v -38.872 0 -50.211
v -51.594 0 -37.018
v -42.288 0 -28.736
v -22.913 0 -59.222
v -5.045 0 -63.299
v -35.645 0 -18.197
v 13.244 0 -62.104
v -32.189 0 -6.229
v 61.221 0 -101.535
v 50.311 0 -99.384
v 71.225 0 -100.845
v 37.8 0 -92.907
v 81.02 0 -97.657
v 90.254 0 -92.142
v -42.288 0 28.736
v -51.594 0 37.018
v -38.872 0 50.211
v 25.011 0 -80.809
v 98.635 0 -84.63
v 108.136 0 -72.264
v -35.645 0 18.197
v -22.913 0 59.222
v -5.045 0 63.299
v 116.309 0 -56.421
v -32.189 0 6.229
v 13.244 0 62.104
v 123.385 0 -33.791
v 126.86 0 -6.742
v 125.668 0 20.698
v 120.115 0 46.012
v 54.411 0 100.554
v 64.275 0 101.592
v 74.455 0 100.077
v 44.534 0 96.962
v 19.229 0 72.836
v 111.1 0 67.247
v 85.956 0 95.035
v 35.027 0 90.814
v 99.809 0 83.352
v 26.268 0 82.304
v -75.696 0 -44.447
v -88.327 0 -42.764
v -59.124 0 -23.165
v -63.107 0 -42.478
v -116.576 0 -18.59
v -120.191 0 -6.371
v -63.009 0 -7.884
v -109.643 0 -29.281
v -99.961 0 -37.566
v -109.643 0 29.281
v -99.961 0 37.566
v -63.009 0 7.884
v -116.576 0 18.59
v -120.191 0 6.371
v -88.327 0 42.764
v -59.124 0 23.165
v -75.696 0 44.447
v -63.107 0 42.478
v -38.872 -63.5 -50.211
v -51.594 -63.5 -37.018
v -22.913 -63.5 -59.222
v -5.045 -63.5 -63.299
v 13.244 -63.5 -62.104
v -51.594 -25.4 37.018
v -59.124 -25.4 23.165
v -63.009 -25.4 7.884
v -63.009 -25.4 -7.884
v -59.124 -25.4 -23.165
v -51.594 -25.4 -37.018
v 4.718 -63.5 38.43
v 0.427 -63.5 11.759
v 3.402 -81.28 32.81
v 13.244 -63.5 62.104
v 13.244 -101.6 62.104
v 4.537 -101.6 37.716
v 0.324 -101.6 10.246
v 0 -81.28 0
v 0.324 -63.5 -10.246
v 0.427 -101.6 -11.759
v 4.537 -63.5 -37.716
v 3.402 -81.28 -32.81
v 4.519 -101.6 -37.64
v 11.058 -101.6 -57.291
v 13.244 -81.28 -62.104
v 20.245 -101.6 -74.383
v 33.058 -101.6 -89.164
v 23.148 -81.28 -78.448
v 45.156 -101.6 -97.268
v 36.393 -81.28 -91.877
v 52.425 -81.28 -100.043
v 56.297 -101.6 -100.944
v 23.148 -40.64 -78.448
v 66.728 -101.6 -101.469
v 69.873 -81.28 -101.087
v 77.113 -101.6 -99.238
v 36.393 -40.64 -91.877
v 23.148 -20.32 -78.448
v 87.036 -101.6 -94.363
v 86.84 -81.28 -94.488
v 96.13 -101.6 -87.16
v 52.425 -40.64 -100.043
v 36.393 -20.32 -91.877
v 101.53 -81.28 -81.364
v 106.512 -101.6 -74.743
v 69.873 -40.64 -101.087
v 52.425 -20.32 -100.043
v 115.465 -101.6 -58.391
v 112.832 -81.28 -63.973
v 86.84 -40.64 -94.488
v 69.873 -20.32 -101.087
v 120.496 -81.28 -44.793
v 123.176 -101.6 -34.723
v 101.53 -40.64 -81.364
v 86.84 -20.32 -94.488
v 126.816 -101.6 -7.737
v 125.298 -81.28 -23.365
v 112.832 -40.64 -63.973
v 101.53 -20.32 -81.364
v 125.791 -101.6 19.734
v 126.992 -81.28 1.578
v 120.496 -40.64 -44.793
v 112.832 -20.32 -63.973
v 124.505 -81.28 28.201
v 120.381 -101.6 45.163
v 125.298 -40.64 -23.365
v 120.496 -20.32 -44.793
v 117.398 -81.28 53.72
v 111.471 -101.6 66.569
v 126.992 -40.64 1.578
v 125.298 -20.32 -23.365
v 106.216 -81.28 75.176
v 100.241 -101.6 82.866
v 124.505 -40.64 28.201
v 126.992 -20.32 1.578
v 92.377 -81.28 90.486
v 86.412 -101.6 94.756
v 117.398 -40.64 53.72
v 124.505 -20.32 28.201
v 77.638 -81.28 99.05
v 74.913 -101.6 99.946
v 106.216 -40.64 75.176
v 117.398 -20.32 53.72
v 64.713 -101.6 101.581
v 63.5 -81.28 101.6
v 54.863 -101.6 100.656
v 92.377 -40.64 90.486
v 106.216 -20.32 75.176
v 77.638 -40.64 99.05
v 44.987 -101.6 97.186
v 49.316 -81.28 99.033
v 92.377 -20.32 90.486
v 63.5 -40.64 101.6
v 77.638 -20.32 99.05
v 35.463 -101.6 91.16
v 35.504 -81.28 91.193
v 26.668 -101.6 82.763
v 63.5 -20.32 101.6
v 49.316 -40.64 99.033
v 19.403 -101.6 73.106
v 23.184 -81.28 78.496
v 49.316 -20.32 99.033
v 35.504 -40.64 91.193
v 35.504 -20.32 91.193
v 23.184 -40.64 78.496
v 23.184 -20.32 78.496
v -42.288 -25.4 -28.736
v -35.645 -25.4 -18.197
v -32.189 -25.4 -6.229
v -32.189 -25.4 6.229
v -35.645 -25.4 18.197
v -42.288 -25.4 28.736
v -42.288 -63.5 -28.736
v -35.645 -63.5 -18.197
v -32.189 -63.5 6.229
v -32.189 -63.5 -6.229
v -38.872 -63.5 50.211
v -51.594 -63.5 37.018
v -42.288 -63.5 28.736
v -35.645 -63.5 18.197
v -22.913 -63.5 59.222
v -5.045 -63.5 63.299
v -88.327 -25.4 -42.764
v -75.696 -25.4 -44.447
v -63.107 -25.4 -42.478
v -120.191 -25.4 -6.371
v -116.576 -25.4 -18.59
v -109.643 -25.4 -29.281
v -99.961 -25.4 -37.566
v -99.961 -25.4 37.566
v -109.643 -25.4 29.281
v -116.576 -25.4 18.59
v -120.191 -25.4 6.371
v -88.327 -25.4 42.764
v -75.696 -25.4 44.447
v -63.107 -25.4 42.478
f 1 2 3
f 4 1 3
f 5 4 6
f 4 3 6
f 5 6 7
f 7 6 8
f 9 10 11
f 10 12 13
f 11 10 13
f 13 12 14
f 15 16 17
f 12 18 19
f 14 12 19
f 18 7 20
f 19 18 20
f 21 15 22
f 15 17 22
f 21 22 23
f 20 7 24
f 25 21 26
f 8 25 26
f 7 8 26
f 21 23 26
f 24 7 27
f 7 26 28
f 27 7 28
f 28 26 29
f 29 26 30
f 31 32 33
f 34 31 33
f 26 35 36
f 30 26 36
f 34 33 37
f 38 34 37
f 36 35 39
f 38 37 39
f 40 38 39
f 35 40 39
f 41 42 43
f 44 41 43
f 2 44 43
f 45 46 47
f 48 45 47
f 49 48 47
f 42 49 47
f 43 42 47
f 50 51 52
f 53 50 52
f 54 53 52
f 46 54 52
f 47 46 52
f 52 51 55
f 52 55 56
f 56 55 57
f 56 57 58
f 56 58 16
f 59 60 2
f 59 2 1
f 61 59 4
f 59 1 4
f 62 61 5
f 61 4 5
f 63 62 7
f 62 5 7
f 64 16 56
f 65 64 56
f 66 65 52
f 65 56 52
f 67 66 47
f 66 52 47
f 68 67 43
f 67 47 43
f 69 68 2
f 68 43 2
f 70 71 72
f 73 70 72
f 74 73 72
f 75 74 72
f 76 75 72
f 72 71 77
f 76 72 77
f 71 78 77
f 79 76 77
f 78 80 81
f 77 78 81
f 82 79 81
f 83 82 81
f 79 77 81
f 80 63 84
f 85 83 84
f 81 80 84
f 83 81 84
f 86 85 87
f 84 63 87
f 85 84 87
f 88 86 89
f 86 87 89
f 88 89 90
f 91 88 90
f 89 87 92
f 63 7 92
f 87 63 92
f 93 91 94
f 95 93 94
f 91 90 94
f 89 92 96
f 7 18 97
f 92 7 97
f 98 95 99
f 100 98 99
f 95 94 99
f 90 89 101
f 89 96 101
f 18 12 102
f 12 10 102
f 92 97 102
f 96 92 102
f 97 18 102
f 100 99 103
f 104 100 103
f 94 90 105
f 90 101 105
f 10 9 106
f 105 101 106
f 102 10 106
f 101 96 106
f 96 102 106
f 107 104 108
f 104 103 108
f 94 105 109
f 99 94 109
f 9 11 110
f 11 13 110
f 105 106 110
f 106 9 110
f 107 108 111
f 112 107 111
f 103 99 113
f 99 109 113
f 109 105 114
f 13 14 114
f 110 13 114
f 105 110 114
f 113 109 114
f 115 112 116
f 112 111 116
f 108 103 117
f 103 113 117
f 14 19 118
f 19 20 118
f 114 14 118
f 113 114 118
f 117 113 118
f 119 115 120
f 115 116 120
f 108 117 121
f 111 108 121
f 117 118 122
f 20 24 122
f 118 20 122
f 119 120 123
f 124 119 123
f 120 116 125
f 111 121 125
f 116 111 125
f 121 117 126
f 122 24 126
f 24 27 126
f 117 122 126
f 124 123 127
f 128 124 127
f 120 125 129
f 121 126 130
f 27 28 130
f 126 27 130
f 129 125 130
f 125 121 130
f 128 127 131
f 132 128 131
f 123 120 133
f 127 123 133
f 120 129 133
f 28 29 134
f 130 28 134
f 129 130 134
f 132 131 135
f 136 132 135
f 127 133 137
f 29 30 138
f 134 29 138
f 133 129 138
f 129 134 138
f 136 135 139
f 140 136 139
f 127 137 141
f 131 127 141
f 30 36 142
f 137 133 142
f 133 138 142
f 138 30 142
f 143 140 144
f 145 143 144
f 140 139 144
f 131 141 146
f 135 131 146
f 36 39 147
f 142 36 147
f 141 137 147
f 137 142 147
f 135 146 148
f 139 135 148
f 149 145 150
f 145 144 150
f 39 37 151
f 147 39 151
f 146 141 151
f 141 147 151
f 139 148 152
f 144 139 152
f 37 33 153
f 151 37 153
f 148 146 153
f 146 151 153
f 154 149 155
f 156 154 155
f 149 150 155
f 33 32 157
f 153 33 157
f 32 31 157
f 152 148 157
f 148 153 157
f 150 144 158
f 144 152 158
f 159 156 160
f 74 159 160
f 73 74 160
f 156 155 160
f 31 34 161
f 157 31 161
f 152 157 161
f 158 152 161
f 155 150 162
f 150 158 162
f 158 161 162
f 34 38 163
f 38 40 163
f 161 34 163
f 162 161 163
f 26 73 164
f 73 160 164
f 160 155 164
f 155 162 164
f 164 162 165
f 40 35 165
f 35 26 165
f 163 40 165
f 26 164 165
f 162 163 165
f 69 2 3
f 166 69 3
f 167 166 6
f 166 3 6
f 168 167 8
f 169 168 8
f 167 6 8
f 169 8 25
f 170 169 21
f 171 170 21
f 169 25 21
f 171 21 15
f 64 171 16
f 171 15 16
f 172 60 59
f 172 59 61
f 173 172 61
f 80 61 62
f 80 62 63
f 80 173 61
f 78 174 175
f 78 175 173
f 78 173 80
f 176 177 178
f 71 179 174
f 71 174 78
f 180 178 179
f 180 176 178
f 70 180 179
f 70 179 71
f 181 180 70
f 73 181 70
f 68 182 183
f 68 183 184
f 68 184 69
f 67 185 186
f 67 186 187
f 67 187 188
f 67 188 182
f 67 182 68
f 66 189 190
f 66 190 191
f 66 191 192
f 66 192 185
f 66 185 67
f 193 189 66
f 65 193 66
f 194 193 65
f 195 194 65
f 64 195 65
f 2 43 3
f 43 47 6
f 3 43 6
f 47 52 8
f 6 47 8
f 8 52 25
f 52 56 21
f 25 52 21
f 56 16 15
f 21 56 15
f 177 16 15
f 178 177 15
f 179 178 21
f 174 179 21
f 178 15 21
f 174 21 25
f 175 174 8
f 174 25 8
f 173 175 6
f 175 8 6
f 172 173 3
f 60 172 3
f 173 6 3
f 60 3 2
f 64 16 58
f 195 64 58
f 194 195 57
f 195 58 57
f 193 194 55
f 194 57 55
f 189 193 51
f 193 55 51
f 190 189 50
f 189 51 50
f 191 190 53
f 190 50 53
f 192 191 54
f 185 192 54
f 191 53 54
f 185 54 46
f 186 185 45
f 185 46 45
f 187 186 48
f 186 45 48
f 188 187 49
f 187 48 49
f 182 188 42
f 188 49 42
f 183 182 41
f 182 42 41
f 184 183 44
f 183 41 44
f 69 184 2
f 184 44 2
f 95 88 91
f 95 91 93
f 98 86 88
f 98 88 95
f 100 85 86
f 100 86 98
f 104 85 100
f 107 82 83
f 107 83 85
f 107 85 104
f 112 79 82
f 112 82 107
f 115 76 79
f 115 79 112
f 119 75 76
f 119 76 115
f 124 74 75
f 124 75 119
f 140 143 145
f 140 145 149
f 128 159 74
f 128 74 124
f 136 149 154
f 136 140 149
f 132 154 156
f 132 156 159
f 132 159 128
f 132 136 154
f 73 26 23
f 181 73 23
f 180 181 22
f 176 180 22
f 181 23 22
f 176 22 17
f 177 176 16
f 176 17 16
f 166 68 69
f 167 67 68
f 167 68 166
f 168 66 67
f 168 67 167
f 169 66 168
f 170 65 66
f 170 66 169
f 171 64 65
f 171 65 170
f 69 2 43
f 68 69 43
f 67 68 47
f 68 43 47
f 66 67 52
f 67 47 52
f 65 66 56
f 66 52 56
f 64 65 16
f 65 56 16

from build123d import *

# Parameters (mm, degrees)
F1_DEPTH = 25.4
F2_DEPTH = 63.5
F3_DEPTH = 101.6
F4_DEPTH = 25.4


with BuildPart() as f1:
    # F0 (on Front) → F1 (new body)
    with BuildSketch(Plane.XZ):
        with BuildLine():
            ThreePointArc((-51.59375, -37.0180356169), (-60.4501990278, -19.4428248333), (-63.5, 0))
            ThreePointArc((-63.5, 0), (-60.4501990278, 19.4428248333), (-51.59375, 37.0180356169))
            ThreePointArc((-51.59375, 37.0180356169), (-120.65, 0), (-51.59375, -37.0180356169))
        make_face()
    extrude(amount=F1_DEPTH)


with BuildPart() as f2:
    # F0 (on Front) → F2 (new body)
    with BuildSketch(Plane.XZ):
        with BuildLine():
            Line((-31.75, 0), (0, 0))
            Line((0, 0), (0, 63.5))
            ThreePointArc((0, 63.5), (-28.9965923716, 56.4928989417), (-51.59375, 37.0180356169))
            ThreePointArc((-51.59375, 37.0180356169), (-37.0237934934, 21.0006510316), (-31.75, 0))
        make_face()
        with BuildLine():
            add(Edge.make_bspline(
                [(0, 0), (0, -34.6669399309), (13.2439655959, -62.1035214404)],
                knots=[4.7123889804, 4.7123889804, 4.7123889804, 5.370034499, 5.370034499, 5.370034499], degree=2, weights=[1, 0.9464231645, 1]))
            Line((0, 0), (-31.75, 0))
            ThreePointArc((-31.75, 0), (-37.0237934934, -21.0006510316), (-51.59375, -37.0180356169))
            ThreePointArc((-51.59375, -37.0180356169), (-22.9128106244, -59.2220660674), (13.2439655959, -62.1035214404))
        make_face()
        with BuildLine():
            Line((0, 63.5), (0, 0))
            add(Edge.make_bspline(
                [(13.2439655959, 62.1035214404), (0, 34.6669399309), (0, 0)],
                knots=[4.0547434617, 4.0547434617, 4.0547434617, 4.7123889804, 4.7123889804, 4.7123889804], degree=2, weights=[1, 0.9464231645, 1]))
            ThreePointArc((13.2439655959, 62.1035214404), (6.6586931352, 63.1499153264), (0, 63.5))
        make_face()
    extrude(amount=F2_DEPTH)

    # F0 (on Front) → F3 (join)
    with BuildSketch(Plane.XZ):
        with BuildLine():
            add(Edge.make_bspline(
                [(63.5, 101.6), (32.3093875408, 101.6), (13.2439655959, 62.1035214404)],
                knots=[3.1415926536, 3.1415926536, 3.1415926536, 4.0547434617, 4.0547434617, 4.0547434617], degree=2, weights=[1, 0.8975675831, 1]))
            ThreePointArc((13.2439655959, 62.1035214404), (49.3621404284, 39.9453262889), (63.5, 0))
            Line((63.5, 0), (63.5, 101.6))
        make_face()
        with BuildLine():
            add(Edge.make_bspline(
                [(13.2439655959, 62.1035214404), (0, 34.6669399309), (0, 0)],
                knots=[4.0547434617, 4.0547434617, 4.0547434617, 4.7123889804, 4.7123889804, 4.7123889804], degree=2, weights=[1, 0.9464231645, 1]))
            add(Edge.make_bspline(
                [(0, 0), (0, -34.6669399309), (13.2439655959, -62.1035214404)],
                knots=[4.7123889804, 4.7123889804, 4.7123889804, 5.370034499, 5.370034499, 5.370034499], degree=2, weights=[1, 0.9464231645, 1]))
            ThreePointArc((13.2439655959, -62.1035214404), (49.3621404284, -39.9453262889), (63.5, 0))
            ThreePointArc((63.5, 0), (49.3621404284, 39.9453262889), (13.2439655959, 62.1035214404))
        make_face()
        with BuildLine():
            ThreePointArc((63.5, 0), (49.3621404284, -39.9453262889), (13.2439655959, -62.1035214404))
            add(Edge.make_bspline(
                [(13.2439655959, -62.1035214404), (75.5537087854, -191.1861844445), (120.4955415237, -44.7930922222), (165.437374262, 101.6), (63.5, 101.6)],
                knots=[5.370034499, 5.370034499, 5.370034499, 7.3974062299, 7.3974062299, 9.4247779608, 9.4247779608, 9.4247779608], degree=2, weights=[1, 0.5287358074, 1, 0.5287358074, 1]))
            Line((63.5, 101.6), (63.5, 0))
        make_face()
    extrude(amount=F3_DEPTH)


with BuildPart() as f4:
    # F0 (on Front) → F4 (new body)
    with BuildSketch(Plane.XZ):
        with BuildLine():
            Line((-63.5, 0), (-31.75, 0))
            ThreePointArc((-31.75, 0), (-37.0237934934, 21.0006510316), (-51.59375, 37.0180356169))
            ThreePointArc((-51.59375, 37.0180356169), (-60.4501990278, 19.4428248333), (-63.5, 0))
        make_face()
        with BuildLine():
            ThreePointArc((-51.59375, -37.0180356169), (-37.0237934934, -21.0006510316), (-31.75, 0))
            Line((-31.75, 0), (-63.5, 0))
            ThreePointArc((-63.5, 0), (-60.4501990278, -19.4428248333), (-51.59375, -37.0180356169))
        make_face()
    extrude(amount=F4_DEPTH)


solid = Compound([f1.part, f2.part, f4.part])
